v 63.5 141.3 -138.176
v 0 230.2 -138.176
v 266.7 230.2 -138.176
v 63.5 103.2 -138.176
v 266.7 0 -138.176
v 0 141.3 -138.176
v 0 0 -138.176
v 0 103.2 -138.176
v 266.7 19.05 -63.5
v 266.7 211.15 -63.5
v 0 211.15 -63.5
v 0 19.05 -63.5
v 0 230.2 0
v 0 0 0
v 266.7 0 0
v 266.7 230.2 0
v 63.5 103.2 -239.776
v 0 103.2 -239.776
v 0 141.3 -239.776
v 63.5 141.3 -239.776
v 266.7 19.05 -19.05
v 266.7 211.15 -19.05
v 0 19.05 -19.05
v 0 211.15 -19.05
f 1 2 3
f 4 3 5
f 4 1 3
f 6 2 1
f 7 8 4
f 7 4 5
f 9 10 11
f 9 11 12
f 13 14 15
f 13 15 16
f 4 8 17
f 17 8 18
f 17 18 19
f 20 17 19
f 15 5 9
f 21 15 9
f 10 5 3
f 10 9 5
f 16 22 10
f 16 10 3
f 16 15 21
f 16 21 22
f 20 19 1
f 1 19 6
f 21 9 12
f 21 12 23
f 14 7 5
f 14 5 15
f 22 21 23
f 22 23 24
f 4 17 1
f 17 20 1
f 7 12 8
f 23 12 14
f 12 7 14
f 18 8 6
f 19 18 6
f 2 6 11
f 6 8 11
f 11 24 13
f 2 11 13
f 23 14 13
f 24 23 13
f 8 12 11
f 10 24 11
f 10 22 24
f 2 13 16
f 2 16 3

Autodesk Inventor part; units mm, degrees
ref_plane "YZ Plane" through (0, 0, 0) normal (1, 0, 0) x (0, 1, 0)
ref_plane "XZ Plane" through (0, 0, 0) normal (0, 1, 0) x (-1, 0, 0)
ref_plane "XY Plane" through (0, 0, 0) normal (0, 0, 1) x (1, 0, 0)
sketch "Sketch1" plane through (0, 0, 0) normal (1, 0, 0) x (0, 1, 0)
  line L0 (0, 0) -> (230.2002, 0)
  line L1 (230.2002, 0) -> (230.2002, -138.176)
  line L2 (230.2002, -138.176) -> (0, -138.176)
  line L3 (0, -138.176) -> (0, 0)
  dimension "d0" = 230.2002
  dimension "d1" = 138.176
extrude "Extrusion1" add sketch "Sketch1" along normal blind 266.7
sketch "Sketch2" plane through (266.7, 0, 0) normal (1, 0, 0) x (0, 0, -1)
  line L0 (0, 230.2002) -> (0, 0) projected
  line L1 (0, 0) -> (138.176, 0) projected
  line L2 (138.176, 0) -> (138.176, 230.2002) projected
  line L3 (138.176, 230.2002) -> (0, 230.2002) projected
  line L4 (19.05, 211.1502) -> (63.5, 211.1502)
  line L5 (63.5, 211.1502) -> (63.5, 19.05)
  line L6 (63.5, 19.05) -> (19.05, 19.05)
  line L7 (19.05, 19.05) -> (19.05, 211.1502)
  dimension "d4" = 19.05
  dimension "d5" = 63.5
  dimension "d7" = 19.05
  dimension "d17" = 19.05
extrude "Extrusion2" cut sketch "Sketch2" against normal blind 266.7 contours L4 L5 L6 L7
sketch "Sketch3" plane through (0, 0, 0) normal (-1, 0, 0) x (0, 0, 1)
  line L0 (-19.05, 211.1502) -> (-19.05, 19.05) projected
  line L1 (-19.05, 19.05) -> (-63.5, 19.05) projected
  line L2 (-63.5, 19.05) -> (-63.5, 211.1502) projected
  line L3 (-63.5, 211.1502) -> (-19.05, 211.1502) projected
  line L4 (0, 0) -> (0, 230.2002) projected
  line L5 (0, 230.2002) -> (-138.176, 230.2002) projected
  line L6 (-138.176, 230.2002) -> (-138.176, 0) projected
  line L7 (-138.176, 0) -> (0, 0) projected
  line L8 (-138.176, 103.2002) -> (-239.776, 103.2002)
  line L9 (-239.776, 103.2002) -> (-239.776, 141.3002)
  line L10 (-239.776, 141.3002) -> (-138.176, 141.3002)
  line L11 (-138.176, 141.3002) -> (-138.176, 103.2002)
  dimension "d11" = 101.6
  dimension "d12" = 38.1
  dimension "d14" = 127
extrude "Extrusion3" add sketch "Sketch3" against normal blind 63.5 contours L8 L9 L10 L6
properties part number "ShooterProto"
